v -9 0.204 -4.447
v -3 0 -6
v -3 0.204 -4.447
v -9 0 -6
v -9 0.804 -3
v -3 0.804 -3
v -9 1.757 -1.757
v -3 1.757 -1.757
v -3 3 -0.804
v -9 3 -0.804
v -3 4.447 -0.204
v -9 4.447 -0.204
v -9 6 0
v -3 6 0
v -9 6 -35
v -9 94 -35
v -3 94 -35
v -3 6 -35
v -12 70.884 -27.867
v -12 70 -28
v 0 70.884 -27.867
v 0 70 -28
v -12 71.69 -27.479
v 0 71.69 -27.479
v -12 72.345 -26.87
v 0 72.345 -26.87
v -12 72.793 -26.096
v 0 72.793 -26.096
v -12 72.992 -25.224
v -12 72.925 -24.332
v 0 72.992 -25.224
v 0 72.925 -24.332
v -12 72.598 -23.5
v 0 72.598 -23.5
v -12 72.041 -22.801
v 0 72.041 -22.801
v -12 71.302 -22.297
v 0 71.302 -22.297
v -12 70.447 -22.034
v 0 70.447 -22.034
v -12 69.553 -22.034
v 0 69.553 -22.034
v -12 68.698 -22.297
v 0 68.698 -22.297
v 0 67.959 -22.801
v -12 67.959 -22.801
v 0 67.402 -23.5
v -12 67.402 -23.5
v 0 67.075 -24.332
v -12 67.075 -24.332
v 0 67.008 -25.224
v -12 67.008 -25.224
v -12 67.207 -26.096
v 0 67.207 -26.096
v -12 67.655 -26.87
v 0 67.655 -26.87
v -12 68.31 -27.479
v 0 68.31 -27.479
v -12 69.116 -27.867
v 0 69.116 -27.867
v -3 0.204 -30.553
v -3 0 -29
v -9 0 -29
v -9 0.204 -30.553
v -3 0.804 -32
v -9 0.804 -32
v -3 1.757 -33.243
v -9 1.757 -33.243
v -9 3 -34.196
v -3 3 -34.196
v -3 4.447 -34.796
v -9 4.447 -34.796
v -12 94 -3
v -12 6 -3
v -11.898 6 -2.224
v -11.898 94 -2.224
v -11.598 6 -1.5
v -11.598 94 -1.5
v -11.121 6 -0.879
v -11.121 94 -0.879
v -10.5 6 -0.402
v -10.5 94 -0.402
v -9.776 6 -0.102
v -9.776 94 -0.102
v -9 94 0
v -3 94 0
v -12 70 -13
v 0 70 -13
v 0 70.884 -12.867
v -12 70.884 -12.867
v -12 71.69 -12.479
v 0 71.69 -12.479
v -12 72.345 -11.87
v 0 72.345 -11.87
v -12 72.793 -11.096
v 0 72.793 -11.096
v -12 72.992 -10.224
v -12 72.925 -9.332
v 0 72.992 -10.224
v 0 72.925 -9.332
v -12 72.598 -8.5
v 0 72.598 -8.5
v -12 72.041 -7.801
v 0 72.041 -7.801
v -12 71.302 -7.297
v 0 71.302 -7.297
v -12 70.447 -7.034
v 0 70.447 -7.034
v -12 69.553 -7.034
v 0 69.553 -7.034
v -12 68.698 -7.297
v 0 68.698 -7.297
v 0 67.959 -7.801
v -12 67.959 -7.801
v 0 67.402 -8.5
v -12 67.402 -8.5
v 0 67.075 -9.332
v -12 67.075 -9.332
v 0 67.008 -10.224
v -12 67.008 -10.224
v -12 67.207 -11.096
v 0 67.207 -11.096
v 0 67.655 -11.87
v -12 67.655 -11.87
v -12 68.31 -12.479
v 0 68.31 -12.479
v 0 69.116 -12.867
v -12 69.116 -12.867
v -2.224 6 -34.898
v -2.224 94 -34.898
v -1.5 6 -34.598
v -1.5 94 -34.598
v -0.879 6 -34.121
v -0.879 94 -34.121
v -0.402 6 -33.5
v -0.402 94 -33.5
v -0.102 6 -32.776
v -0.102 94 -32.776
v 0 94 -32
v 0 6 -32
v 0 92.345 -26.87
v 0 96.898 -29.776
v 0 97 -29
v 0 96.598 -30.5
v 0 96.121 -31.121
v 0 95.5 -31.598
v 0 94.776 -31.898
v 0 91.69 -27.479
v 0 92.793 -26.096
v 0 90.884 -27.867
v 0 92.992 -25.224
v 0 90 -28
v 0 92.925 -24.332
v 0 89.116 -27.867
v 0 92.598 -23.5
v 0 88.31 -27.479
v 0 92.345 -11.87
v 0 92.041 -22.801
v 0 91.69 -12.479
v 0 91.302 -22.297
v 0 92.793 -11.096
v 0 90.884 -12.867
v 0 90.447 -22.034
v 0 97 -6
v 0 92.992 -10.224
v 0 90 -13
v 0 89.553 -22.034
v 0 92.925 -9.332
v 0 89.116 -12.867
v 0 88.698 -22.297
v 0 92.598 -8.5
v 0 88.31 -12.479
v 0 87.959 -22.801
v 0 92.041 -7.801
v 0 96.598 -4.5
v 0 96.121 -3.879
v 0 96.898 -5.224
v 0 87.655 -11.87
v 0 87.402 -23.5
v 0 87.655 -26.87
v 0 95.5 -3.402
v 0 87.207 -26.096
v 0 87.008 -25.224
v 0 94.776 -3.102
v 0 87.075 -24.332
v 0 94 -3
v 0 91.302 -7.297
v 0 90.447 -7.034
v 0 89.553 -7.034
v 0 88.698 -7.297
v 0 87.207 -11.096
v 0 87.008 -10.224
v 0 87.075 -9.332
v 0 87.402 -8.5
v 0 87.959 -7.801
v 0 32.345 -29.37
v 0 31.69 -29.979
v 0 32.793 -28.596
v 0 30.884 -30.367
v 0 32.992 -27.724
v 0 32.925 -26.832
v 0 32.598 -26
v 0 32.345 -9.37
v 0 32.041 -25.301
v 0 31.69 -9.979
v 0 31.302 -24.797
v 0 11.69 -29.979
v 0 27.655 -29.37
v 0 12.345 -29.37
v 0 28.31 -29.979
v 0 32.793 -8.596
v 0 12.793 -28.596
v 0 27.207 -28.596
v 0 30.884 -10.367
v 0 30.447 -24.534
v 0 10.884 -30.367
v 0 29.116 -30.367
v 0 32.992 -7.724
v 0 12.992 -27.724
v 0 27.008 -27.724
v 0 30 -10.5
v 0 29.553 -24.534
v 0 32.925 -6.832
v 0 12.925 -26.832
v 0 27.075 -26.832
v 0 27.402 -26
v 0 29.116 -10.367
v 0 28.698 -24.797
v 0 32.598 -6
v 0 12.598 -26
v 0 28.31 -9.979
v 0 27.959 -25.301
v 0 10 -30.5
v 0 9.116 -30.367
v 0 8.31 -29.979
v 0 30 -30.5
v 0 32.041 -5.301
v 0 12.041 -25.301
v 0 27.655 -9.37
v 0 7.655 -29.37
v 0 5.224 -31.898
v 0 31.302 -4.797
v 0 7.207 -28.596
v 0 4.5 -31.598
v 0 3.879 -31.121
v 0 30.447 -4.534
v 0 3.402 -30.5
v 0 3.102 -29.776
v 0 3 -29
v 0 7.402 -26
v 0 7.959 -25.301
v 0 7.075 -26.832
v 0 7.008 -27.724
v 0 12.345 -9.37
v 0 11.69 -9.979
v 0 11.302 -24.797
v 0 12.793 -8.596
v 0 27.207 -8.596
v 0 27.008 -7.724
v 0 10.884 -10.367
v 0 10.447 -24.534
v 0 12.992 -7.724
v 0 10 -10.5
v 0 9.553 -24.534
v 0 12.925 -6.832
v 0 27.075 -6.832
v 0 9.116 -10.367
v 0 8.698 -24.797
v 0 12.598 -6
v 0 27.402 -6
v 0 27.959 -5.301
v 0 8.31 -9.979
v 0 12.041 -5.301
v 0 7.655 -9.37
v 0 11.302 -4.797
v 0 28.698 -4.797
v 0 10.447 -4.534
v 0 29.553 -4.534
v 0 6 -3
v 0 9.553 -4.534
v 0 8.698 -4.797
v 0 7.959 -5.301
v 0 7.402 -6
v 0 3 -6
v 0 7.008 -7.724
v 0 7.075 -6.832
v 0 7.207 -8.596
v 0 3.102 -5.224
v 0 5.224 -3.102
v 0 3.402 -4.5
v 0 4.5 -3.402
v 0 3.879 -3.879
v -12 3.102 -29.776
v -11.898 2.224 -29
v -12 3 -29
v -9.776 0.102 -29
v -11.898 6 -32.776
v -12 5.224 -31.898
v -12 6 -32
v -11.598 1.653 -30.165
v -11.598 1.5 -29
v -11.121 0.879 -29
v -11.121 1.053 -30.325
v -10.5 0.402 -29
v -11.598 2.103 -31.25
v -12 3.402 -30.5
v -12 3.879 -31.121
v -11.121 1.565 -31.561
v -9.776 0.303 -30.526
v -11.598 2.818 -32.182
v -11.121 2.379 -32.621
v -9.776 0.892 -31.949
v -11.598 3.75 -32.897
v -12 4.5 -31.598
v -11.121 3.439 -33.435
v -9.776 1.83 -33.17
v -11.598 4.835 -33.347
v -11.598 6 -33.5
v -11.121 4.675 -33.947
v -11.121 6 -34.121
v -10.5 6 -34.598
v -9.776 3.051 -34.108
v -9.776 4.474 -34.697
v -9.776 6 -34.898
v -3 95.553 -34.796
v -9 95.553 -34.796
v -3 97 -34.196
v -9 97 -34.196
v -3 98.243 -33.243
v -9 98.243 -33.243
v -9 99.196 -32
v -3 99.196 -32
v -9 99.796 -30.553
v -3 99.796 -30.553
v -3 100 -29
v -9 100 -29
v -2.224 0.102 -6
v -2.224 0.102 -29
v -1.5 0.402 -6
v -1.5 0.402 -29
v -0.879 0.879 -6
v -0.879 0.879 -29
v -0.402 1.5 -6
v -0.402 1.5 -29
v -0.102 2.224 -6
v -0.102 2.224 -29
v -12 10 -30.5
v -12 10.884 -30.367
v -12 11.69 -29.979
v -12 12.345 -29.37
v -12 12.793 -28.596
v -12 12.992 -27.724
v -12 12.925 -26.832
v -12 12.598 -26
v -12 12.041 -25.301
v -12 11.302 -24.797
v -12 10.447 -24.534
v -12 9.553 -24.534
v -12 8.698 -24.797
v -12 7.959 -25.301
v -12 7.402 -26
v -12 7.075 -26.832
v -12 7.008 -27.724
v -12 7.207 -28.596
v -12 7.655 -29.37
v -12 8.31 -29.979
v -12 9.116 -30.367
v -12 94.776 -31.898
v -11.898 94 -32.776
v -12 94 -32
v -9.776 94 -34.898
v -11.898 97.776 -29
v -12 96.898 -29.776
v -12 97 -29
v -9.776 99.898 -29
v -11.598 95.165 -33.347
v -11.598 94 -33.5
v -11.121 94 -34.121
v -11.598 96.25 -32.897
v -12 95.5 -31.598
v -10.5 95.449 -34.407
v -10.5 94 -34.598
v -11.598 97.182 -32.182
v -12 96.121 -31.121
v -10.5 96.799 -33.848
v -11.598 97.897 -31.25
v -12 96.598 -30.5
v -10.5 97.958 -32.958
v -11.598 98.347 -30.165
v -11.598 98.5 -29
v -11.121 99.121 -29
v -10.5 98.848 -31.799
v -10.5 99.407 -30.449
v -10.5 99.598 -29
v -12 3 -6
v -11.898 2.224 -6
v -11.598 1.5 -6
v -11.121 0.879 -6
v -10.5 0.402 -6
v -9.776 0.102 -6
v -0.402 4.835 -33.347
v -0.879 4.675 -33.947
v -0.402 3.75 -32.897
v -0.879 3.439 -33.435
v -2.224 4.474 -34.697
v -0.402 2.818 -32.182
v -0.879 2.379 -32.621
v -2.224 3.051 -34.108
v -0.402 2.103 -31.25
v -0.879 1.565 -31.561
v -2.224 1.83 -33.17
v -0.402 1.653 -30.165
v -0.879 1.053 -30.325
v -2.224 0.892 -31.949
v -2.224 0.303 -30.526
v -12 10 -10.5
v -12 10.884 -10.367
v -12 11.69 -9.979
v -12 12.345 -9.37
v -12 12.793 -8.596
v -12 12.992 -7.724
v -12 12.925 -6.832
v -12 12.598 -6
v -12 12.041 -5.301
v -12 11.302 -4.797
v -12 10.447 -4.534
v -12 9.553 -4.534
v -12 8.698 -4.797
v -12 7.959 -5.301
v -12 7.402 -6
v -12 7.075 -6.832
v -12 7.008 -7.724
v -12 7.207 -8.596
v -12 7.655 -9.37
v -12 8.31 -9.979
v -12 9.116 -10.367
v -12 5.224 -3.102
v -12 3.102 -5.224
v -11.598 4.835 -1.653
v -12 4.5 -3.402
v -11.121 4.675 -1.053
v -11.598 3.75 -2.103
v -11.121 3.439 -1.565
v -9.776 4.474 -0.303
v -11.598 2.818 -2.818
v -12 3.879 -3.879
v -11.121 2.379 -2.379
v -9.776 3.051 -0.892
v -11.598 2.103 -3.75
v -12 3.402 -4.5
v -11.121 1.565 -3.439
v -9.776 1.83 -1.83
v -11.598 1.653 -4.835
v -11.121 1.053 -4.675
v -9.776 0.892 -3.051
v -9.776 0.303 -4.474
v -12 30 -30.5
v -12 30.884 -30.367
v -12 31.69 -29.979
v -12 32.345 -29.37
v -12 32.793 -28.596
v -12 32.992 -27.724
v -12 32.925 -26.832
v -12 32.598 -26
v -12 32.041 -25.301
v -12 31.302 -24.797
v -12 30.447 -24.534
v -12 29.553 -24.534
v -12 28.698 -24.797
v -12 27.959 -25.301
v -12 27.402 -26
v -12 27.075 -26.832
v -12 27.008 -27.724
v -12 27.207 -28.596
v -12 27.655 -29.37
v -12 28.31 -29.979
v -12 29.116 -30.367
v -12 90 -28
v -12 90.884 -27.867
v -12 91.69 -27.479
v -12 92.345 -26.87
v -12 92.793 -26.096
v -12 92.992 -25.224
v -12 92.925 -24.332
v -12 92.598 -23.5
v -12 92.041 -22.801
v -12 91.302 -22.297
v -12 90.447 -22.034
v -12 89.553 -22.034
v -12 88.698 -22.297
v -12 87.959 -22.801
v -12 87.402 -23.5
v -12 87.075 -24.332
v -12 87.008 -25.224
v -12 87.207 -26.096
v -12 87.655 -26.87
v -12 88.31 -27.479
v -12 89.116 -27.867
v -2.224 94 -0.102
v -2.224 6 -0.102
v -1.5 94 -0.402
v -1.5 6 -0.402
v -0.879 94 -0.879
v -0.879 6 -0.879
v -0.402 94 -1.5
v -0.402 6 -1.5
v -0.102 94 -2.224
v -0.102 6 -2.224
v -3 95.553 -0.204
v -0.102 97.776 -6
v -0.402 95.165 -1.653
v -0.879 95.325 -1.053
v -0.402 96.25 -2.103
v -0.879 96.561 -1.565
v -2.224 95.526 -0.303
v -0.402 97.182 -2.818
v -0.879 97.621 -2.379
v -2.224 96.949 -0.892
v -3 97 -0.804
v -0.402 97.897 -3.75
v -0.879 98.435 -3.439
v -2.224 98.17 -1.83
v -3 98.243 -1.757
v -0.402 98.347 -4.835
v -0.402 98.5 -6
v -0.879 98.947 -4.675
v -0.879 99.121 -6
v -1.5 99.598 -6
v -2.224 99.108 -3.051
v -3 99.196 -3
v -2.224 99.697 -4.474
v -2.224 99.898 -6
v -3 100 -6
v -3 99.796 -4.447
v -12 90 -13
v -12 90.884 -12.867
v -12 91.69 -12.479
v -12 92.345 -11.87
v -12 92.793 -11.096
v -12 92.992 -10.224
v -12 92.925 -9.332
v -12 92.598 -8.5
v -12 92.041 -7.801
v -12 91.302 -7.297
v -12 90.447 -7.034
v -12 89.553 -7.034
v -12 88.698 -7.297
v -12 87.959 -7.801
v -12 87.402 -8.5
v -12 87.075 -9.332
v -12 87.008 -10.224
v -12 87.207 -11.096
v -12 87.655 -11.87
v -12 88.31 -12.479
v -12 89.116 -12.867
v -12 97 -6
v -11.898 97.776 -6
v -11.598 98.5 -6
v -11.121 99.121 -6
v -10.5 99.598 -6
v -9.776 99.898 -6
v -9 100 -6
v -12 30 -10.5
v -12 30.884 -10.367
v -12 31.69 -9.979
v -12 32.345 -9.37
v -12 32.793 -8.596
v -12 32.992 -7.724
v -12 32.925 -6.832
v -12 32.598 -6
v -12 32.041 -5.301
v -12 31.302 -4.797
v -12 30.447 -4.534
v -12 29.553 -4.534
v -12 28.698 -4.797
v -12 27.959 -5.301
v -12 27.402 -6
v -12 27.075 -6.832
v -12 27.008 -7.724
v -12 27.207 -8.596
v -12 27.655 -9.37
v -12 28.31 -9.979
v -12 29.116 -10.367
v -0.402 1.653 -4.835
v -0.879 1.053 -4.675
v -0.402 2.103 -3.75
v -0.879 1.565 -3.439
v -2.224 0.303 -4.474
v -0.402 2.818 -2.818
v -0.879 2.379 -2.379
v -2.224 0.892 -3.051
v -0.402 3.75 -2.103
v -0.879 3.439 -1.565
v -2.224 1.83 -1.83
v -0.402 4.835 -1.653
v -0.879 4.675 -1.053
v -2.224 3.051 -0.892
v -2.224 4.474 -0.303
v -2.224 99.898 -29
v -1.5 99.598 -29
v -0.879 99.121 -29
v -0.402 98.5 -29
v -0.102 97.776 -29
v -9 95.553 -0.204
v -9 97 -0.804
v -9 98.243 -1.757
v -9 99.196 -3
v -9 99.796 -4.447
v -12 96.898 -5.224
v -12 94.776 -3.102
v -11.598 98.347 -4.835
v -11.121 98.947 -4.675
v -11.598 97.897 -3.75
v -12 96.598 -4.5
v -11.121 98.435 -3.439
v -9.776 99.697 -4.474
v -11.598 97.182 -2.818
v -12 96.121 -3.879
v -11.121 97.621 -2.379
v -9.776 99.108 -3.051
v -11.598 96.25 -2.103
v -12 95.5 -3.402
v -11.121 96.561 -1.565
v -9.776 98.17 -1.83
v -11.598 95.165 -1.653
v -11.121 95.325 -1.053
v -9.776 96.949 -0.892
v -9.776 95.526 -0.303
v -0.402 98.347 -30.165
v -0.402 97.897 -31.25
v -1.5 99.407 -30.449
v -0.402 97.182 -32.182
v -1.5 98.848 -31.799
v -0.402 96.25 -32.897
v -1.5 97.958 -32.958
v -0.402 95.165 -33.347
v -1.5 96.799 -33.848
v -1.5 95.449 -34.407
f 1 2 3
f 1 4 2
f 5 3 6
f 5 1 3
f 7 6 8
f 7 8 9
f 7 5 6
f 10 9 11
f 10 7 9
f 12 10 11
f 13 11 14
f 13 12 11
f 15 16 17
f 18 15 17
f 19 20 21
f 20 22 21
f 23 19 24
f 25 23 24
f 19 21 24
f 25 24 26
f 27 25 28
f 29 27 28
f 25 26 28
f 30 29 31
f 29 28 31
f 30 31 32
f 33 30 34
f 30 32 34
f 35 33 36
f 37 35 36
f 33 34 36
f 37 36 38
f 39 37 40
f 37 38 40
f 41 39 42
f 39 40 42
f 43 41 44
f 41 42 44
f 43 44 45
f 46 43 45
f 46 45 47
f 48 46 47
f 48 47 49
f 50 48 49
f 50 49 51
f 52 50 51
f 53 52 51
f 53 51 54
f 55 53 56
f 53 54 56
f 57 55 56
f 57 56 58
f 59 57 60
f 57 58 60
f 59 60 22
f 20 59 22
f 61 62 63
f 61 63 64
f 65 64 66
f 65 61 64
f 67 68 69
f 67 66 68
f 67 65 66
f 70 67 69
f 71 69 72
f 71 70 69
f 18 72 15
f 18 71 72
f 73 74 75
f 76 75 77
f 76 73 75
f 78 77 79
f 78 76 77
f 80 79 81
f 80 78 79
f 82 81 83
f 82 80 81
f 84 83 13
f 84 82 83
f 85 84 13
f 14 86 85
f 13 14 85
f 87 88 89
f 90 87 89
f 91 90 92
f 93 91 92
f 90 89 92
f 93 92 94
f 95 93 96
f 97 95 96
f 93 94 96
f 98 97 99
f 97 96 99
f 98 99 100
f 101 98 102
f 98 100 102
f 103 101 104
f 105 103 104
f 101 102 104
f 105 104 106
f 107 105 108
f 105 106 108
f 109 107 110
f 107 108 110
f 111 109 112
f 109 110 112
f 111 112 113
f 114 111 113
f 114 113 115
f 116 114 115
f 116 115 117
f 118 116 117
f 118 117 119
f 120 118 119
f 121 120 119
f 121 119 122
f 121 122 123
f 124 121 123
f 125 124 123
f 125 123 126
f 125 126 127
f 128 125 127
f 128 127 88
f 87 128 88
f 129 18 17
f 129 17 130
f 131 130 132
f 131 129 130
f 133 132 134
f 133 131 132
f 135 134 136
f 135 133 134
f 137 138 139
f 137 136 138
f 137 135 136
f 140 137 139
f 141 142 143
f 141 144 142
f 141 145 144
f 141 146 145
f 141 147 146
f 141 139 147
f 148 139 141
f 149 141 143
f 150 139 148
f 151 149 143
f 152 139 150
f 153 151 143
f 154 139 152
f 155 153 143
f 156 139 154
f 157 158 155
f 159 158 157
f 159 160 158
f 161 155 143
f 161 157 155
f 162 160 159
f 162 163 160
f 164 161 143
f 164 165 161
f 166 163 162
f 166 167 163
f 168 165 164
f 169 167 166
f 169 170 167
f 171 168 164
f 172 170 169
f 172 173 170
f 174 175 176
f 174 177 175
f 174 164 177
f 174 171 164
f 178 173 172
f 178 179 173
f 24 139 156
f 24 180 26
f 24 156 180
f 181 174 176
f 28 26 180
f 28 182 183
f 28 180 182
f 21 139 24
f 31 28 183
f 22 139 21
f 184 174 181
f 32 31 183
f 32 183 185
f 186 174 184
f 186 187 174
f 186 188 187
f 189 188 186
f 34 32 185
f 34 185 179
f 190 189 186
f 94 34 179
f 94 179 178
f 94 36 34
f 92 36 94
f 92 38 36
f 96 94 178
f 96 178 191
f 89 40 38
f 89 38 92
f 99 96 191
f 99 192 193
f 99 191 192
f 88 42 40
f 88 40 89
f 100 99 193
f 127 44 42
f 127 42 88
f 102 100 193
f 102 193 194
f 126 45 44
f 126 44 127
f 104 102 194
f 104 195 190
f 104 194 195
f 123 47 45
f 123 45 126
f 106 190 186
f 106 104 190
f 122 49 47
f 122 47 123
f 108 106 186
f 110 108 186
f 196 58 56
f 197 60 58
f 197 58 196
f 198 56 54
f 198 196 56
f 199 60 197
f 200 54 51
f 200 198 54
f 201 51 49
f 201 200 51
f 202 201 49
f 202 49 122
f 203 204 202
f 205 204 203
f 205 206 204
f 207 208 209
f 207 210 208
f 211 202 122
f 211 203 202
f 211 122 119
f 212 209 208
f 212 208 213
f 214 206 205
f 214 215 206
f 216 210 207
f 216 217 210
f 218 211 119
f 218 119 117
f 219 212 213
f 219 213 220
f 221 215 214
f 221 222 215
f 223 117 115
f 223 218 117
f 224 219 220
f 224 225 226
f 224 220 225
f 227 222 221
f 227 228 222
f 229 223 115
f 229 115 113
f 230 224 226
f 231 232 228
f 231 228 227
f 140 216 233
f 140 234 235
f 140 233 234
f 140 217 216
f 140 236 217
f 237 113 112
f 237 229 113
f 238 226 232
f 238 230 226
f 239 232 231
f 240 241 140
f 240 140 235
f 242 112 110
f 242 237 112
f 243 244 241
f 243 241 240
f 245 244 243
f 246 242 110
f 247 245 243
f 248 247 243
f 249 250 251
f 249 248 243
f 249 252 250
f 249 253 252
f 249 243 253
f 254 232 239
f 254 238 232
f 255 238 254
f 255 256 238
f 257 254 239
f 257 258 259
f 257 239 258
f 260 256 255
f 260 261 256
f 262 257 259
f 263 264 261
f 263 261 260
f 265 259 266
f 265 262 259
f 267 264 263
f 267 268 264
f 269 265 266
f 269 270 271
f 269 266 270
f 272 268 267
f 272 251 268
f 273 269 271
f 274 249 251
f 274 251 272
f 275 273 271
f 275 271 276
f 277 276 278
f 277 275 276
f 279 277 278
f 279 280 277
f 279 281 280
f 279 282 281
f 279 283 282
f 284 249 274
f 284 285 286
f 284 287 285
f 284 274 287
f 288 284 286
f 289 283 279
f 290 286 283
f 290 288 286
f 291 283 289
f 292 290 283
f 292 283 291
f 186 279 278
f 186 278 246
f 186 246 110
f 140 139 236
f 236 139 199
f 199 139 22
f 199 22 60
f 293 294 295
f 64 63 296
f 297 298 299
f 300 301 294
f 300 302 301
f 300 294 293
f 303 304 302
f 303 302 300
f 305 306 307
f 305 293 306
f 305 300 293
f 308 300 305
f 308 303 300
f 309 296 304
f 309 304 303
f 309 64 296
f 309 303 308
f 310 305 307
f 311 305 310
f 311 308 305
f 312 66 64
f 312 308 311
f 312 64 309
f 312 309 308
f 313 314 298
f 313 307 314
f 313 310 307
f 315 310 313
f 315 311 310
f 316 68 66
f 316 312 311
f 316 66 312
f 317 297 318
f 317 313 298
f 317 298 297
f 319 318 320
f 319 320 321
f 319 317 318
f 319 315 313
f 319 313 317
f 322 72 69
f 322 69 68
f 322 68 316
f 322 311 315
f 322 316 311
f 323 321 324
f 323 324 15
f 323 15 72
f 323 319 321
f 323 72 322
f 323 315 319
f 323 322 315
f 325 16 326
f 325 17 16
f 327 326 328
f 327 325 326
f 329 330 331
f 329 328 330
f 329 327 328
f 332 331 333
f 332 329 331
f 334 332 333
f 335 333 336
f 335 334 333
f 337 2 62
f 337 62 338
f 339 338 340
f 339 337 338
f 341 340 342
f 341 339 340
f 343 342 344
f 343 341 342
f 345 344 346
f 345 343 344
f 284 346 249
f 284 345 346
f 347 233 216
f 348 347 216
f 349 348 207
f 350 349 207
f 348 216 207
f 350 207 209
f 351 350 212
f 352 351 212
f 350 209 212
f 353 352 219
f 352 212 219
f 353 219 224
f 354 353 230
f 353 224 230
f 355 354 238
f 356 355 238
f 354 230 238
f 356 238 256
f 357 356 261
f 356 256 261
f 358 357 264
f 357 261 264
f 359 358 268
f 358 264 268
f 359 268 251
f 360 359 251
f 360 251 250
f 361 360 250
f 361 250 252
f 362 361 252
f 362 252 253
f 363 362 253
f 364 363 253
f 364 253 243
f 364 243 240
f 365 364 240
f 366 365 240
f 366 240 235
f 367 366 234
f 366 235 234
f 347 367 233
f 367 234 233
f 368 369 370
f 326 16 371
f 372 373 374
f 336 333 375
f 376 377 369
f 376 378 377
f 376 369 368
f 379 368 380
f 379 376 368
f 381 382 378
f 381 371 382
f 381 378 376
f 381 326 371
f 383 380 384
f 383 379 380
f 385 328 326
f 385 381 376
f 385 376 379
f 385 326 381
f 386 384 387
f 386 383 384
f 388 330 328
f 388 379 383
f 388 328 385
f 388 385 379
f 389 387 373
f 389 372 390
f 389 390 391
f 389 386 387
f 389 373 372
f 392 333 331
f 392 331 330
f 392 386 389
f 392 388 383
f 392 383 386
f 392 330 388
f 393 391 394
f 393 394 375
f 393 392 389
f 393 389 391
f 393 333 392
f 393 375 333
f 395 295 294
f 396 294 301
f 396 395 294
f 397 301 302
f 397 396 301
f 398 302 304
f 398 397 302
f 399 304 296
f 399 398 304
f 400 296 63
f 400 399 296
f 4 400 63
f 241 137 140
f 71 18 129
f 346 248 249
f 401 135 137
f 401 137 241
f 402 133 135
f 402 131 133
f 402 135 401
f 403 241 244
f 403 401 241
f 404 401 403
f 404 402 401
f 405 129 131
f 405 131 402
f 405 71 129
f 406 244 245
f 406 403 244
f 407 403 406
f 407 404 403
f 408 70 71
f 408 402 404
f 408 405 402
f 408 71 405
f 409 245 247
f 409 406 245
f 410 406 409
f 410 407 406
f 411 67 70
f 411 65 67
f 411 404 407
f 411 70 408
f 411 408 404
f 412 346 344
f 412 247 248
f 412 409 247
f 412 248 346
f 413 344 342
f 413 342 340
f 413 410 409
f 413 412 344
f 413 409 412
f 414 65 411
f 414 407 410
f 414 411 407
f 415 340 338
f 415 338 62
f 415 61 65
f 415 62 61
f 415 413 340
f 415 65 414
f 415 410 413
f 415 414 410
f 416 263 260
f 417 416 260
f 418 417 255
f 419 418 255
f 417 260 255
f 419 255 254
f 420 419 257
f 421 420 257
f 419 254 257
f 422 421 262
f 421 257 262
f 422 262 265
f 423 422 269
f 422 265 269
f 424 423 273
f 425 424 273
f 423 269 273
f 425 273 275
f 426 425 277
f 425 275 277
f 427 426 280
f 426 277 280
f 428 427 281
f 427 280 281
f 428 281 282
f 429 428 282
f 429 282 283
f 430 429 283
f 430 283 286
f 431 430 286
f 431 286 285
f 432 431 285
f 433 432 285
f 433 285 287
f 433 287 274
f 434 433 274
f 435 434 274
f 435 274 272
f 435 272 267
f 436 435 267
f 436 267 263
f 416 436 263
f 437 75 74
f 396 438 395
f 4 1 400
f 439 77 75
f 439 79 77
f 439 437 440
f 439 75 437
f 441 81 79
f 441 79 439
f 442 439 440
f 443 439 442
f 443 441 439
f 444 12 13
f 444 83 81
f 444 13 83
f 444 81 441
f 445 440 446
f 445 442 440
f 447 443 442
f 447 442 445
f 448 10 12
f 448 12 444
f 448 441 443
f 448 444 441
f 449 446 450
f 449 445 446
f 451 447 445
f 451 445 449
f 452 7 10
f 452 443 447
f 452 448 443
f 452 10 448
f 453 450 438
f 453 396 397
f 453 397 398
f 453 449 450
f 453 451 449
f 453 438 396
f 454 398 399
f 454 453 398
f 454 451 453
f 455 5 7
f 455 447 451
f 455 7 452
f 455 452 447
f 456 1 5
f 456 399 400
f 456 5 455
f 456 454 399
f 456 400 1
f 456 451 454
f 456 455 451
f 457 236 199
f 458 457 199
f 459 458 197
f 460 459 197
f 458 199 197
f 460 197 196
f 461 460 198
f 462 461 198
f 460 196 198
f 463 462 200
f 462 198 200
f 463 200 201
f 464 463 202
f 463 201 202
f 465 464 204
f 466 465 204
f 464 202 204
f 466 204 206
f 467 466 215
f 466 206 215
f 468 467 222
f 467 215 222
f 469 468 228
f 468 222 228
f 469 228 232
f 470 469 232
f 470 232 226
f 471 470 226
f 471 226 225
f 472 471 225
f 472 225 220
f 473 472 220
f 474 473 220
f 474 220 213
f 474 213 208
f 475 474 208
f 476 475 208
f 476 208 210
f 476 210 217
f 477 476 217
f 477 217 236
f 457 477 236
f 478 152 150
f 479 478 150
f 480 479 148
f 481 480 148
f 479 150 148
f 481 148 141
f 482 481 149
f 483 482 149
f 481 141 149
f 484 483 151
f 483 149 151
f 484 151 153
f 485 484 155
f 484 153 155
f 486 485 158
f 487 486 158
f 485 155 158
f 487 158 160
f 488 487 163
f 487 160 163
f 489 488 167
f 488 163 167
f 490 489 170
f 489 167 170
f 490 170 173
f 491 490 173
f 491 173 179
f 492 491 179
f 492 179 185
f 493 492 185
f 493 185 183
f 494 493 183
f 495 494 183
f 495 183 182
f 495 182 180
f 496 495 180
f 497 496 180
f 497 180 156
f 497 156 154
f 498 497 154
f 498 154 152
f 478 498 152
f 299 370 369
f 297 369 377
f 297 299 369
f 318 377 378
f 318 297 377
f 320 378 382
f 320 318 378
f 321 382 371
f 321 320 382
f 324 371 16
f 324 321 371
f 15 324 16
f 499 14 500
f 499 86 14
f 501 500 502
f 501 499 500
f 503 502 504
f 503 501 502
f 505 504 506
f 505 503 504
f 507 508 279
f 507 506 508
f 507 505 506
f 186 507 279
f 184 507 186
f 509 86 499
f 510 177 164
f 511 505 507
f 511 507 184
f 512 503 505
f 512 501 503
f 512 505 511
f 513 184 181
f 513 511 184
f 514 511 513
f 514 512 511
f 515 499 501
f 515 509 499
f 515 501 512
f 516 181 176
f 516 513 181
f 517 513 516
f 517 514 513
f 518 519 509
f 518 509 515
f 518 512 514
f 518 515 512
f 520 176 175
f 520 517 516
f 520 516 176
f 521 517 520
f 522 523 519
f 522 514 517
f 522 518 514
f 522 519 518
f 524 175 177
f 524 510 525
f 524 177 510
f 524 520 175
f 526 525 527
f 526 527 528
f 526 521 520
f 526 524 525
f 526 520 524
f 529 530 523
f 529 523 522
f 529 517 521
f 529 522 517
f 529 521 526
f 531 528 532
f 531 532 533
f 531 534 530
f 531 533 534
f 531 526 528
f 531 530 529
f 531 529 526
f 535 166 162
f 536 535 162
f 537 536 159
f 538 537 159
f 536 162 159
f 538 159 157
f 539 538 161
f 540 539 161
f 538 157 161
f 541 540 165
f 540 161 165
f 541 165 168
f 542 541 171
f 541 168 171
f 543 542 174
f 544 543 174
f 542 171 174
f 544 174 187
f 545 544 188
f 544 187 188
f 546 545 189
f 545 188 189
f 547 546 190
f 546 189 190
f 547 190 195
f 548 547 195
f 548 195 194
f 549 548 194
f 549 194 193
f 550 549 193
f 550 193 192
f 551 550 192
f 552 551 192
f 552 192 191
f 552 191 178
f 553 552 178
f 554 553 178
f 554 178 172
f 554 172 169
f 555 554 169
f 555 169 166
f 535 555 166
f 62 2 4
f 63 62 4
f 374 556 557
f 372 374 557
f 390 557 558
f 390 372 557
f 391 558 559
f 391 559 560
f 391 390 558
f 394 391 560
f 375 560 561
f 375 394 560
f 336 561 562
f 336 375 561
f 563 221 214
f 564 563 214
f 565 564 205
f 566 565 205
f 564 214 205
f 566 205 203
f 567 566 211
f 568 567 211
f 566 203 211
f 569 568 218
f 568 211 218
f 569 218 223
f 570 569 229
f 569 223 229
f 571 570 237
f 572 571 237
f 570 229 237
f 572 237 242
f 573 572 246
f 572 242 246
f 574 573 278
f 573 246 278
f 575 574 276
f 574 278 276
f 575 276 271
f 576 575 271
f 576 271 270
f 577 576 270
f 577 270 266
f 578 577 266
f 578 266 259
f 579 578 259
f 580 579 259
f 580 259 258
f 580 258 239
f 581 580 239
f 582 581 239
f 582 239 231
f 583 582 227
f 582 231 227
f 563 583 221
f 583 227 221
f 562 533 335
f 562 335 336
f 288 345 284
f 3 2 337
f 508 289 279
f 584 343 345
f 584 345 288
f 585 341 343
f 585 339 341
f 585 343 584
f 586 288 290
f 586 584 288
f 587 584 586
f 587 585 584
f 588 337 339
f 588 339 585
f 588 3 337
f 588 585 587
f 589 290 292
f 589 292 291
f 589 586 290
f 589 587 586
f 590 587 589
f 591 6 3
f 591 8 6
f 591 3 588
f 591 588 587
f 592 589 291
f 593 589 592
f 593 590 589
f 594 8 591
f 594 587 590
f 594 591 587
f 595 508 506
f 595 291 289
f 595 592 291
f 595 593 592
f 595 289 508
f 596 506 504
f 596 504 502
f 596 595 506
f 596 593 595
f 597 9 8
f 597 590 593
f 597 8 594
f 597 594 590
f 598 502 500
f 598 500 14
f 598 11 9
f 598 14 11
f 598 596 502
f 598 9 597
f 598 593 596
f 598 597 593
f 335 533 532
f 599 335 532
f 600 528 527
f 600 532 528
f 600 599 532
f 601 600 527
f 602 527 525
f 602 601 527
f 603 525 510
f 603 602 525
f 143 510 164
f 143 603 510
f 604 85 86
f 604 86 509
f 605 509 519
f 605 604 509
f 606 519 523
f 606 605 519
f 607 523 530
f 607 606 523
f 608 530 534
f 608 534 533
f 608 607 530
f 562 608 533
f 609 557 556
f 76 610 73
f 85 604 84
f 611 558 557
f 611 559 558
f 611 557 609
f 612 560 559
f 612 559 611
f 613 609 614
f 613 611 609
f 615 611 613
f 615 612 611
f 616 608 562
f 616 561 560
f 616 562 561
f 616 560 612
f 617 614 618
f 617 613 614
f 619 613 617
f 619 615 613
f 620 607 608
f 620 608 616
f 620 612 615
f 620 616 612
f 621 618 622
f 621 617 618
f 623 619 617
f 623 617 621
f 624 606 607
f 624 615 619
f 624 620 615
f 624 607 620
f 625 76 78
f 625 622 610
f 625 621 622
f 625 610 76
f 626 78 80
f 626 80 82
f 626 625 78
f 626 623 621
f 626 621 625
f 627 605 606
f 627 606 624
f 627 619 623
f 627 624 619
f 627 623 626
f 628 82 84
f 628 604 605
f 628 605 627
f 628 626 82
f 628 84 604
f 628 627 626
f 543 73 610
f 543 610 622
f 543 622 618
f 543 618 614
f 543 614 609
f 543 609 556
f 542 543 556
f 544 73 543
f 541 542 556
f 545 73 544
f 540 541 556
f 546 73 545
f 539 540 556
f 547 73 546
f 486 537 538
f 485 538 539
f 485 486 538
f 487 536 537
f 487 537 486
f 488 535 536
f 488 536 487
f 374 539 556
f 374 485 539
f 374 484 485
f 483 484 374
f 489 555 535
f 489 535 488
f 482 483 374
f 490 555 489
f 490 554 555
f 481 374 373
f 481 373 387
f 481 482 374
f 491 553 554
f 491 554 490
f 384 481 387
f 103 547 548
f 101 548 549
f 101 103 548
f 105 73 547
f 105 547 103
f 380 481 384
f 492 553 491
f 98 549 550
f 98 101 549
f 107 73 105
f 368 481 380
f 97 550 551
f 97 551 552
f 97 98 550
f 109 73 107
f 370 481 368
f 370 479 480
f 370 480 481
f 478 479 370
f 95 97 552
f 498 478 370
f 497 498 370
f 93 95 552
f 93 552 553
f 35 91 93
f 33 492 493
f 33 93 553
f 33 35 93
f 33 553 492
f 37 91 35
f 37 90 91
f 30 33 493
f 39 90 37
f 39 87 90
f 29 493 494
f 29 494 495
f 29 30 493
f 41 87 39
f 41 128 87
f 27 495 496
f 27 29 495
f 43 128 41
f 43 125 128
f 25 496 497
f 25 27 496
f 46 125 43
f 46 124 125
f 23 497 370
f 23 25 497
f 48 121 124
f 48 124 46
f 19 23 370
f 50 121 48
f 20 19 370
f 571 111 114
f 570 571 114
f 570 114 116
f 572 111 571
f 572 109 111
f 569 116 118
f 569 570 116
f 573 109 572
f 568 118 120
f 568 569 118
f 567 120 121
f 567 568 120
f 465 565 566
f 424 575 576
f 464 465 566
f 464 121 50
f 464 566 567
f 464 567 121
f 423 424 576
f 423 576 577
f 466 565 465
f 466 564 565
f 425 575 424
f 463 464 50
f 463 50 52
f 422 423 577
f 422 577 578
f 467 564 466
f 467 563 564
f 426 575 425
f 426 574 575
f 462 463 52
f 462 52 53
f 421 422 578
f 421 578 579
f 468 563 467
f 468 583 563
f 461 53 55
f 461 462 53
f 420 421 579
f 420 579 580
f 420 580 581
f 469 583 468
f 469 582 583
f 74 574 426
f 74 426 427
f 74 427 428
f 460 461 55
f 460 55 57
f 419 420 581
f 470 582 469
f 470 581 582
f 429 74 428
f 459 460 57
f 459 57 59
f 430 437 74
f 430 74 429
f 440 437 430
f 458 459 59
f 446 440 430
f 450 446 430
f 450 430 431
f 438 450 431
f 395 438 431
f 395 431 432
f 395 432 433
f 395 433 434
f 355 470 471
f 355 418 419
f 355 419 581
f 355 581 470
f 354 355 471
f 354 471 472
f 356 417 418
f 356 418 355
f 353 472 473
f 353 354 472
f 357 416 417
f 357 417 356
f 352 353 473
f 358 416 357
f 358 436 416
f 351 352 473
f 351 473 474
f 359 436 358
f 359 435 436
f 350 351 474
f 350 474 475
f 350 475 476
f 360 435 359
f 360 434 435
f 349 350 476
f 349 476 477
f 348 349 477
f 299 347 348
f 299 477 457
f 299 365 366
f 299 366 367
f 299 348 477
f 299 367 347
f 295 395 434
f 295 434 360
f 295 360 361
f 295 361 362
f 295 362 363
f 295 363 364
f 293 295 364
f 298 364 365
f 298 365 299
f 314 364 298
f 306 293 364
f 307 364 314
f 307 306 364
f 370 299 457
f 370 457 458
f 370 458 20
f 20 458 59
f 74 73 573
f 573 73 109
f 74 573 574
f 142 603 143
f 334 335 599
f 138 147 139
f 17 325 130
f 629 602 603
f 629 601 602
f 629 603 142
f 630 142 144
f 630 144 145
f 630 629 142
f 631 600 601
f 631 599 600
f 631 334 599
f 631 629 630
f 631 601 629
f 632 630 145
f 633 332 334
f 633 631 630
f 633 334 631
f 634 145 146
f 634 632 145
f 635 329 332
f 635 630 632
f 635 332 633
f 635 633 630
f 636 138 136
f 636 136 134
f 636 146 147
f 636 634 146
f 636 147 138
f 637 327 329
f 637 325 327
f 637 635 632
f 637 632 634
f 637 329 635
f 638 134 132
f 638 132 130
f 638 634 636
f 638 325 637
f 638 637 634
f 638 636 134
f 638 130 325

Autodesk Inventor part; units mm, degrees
ref_plane "YZ Plane" through (0, 0, 0) normal (1, 0, 0) x (0, 1, 0)
ref_plane "XZ Plane" through (0, 0, 0) normal (0, 1, 0) x (-1, 0, 0)
ref_plane "XY Plane" through (0, 0, 0) normal (0, 0, 1) x (1, 0, 0)
sketch "Sketch1" plane through (0, 0, 0) normal (0, 1, 0) x (-1, 0, 0)
  line L0 (0, 0) -> (12, 0)
  line L1 (12, 0) -> (12, -35)
  line L2 (12, -35) -> (0, -35)
  line L3 (0, -35) -> (0, 0)
  dimension "d0" = 12
  dimension "d1" = 35
extrude "Extrusion1" add sketch "Sketch1" along normal blind 100
sketch "Sketch2" plane through (0, 0, 0) normal (1, 0, 0) x (0, 0, -1)
  circle A0 centre (10, 90) radius 3
  line L0 (0, 0) -> (0, 100) projected
  line L1 (0, 100) -> (35, 100) projected
  circle A1 centre (25, 90) radius 3
  circle A2 centre (10, 70) radius 3
  circle A3 centre (25, 70) radius 3
  circle A4 centre (7.5, 10) radius 3
  line L2 (0, 0) -> (35, 0) projected
  circle A5 centre (27.5, 10) radius 3
  circle A6 centre (7.5, 30) radius 3
  circle A7 centre (27.5, 30) radius 3
  dimension "d4" = 6
  dimension "d5" = 10
  dimension "d6" = 10
  dimension "d9" = 15
  dimension "d12" = 20
  dimension "d15" = 6
  dimension "d16" = 10
  dimension "d17" = 7.5
  dimension "d20" = 20
  dimension "d23" = 20
extrude "Extrusion2" cut sketch "Sketch2" against normal through all
fillet "Fillet1" radius 6 4 edges at (-6, 0, 0) (-6, 0, -35) (-6, 100, 0) (-6, 100, -35)
fillet "Fillet2" radius 3 16 edges at (0, 98.2426, -33.2426) (0, 100, -17.5) (0, 98.2426, -1.7574) (0, 50, 0) (0, 1.7574, -1.7574) (0, 0, -17.5) (0, 1.7574, -33.2426) (0, 50, -35) (-12, 98.2426, -33.2426) (-12, 100, -17.5) (-12, 98.2426, -1.7574) (-12, 50, 0) (-12, 1.7574, -1.7574) (-12, 0, -17.5) (-12, 1.7574, -33.2426) (-12, 50, -35)
properties part number "EboxTslotMountV2"
